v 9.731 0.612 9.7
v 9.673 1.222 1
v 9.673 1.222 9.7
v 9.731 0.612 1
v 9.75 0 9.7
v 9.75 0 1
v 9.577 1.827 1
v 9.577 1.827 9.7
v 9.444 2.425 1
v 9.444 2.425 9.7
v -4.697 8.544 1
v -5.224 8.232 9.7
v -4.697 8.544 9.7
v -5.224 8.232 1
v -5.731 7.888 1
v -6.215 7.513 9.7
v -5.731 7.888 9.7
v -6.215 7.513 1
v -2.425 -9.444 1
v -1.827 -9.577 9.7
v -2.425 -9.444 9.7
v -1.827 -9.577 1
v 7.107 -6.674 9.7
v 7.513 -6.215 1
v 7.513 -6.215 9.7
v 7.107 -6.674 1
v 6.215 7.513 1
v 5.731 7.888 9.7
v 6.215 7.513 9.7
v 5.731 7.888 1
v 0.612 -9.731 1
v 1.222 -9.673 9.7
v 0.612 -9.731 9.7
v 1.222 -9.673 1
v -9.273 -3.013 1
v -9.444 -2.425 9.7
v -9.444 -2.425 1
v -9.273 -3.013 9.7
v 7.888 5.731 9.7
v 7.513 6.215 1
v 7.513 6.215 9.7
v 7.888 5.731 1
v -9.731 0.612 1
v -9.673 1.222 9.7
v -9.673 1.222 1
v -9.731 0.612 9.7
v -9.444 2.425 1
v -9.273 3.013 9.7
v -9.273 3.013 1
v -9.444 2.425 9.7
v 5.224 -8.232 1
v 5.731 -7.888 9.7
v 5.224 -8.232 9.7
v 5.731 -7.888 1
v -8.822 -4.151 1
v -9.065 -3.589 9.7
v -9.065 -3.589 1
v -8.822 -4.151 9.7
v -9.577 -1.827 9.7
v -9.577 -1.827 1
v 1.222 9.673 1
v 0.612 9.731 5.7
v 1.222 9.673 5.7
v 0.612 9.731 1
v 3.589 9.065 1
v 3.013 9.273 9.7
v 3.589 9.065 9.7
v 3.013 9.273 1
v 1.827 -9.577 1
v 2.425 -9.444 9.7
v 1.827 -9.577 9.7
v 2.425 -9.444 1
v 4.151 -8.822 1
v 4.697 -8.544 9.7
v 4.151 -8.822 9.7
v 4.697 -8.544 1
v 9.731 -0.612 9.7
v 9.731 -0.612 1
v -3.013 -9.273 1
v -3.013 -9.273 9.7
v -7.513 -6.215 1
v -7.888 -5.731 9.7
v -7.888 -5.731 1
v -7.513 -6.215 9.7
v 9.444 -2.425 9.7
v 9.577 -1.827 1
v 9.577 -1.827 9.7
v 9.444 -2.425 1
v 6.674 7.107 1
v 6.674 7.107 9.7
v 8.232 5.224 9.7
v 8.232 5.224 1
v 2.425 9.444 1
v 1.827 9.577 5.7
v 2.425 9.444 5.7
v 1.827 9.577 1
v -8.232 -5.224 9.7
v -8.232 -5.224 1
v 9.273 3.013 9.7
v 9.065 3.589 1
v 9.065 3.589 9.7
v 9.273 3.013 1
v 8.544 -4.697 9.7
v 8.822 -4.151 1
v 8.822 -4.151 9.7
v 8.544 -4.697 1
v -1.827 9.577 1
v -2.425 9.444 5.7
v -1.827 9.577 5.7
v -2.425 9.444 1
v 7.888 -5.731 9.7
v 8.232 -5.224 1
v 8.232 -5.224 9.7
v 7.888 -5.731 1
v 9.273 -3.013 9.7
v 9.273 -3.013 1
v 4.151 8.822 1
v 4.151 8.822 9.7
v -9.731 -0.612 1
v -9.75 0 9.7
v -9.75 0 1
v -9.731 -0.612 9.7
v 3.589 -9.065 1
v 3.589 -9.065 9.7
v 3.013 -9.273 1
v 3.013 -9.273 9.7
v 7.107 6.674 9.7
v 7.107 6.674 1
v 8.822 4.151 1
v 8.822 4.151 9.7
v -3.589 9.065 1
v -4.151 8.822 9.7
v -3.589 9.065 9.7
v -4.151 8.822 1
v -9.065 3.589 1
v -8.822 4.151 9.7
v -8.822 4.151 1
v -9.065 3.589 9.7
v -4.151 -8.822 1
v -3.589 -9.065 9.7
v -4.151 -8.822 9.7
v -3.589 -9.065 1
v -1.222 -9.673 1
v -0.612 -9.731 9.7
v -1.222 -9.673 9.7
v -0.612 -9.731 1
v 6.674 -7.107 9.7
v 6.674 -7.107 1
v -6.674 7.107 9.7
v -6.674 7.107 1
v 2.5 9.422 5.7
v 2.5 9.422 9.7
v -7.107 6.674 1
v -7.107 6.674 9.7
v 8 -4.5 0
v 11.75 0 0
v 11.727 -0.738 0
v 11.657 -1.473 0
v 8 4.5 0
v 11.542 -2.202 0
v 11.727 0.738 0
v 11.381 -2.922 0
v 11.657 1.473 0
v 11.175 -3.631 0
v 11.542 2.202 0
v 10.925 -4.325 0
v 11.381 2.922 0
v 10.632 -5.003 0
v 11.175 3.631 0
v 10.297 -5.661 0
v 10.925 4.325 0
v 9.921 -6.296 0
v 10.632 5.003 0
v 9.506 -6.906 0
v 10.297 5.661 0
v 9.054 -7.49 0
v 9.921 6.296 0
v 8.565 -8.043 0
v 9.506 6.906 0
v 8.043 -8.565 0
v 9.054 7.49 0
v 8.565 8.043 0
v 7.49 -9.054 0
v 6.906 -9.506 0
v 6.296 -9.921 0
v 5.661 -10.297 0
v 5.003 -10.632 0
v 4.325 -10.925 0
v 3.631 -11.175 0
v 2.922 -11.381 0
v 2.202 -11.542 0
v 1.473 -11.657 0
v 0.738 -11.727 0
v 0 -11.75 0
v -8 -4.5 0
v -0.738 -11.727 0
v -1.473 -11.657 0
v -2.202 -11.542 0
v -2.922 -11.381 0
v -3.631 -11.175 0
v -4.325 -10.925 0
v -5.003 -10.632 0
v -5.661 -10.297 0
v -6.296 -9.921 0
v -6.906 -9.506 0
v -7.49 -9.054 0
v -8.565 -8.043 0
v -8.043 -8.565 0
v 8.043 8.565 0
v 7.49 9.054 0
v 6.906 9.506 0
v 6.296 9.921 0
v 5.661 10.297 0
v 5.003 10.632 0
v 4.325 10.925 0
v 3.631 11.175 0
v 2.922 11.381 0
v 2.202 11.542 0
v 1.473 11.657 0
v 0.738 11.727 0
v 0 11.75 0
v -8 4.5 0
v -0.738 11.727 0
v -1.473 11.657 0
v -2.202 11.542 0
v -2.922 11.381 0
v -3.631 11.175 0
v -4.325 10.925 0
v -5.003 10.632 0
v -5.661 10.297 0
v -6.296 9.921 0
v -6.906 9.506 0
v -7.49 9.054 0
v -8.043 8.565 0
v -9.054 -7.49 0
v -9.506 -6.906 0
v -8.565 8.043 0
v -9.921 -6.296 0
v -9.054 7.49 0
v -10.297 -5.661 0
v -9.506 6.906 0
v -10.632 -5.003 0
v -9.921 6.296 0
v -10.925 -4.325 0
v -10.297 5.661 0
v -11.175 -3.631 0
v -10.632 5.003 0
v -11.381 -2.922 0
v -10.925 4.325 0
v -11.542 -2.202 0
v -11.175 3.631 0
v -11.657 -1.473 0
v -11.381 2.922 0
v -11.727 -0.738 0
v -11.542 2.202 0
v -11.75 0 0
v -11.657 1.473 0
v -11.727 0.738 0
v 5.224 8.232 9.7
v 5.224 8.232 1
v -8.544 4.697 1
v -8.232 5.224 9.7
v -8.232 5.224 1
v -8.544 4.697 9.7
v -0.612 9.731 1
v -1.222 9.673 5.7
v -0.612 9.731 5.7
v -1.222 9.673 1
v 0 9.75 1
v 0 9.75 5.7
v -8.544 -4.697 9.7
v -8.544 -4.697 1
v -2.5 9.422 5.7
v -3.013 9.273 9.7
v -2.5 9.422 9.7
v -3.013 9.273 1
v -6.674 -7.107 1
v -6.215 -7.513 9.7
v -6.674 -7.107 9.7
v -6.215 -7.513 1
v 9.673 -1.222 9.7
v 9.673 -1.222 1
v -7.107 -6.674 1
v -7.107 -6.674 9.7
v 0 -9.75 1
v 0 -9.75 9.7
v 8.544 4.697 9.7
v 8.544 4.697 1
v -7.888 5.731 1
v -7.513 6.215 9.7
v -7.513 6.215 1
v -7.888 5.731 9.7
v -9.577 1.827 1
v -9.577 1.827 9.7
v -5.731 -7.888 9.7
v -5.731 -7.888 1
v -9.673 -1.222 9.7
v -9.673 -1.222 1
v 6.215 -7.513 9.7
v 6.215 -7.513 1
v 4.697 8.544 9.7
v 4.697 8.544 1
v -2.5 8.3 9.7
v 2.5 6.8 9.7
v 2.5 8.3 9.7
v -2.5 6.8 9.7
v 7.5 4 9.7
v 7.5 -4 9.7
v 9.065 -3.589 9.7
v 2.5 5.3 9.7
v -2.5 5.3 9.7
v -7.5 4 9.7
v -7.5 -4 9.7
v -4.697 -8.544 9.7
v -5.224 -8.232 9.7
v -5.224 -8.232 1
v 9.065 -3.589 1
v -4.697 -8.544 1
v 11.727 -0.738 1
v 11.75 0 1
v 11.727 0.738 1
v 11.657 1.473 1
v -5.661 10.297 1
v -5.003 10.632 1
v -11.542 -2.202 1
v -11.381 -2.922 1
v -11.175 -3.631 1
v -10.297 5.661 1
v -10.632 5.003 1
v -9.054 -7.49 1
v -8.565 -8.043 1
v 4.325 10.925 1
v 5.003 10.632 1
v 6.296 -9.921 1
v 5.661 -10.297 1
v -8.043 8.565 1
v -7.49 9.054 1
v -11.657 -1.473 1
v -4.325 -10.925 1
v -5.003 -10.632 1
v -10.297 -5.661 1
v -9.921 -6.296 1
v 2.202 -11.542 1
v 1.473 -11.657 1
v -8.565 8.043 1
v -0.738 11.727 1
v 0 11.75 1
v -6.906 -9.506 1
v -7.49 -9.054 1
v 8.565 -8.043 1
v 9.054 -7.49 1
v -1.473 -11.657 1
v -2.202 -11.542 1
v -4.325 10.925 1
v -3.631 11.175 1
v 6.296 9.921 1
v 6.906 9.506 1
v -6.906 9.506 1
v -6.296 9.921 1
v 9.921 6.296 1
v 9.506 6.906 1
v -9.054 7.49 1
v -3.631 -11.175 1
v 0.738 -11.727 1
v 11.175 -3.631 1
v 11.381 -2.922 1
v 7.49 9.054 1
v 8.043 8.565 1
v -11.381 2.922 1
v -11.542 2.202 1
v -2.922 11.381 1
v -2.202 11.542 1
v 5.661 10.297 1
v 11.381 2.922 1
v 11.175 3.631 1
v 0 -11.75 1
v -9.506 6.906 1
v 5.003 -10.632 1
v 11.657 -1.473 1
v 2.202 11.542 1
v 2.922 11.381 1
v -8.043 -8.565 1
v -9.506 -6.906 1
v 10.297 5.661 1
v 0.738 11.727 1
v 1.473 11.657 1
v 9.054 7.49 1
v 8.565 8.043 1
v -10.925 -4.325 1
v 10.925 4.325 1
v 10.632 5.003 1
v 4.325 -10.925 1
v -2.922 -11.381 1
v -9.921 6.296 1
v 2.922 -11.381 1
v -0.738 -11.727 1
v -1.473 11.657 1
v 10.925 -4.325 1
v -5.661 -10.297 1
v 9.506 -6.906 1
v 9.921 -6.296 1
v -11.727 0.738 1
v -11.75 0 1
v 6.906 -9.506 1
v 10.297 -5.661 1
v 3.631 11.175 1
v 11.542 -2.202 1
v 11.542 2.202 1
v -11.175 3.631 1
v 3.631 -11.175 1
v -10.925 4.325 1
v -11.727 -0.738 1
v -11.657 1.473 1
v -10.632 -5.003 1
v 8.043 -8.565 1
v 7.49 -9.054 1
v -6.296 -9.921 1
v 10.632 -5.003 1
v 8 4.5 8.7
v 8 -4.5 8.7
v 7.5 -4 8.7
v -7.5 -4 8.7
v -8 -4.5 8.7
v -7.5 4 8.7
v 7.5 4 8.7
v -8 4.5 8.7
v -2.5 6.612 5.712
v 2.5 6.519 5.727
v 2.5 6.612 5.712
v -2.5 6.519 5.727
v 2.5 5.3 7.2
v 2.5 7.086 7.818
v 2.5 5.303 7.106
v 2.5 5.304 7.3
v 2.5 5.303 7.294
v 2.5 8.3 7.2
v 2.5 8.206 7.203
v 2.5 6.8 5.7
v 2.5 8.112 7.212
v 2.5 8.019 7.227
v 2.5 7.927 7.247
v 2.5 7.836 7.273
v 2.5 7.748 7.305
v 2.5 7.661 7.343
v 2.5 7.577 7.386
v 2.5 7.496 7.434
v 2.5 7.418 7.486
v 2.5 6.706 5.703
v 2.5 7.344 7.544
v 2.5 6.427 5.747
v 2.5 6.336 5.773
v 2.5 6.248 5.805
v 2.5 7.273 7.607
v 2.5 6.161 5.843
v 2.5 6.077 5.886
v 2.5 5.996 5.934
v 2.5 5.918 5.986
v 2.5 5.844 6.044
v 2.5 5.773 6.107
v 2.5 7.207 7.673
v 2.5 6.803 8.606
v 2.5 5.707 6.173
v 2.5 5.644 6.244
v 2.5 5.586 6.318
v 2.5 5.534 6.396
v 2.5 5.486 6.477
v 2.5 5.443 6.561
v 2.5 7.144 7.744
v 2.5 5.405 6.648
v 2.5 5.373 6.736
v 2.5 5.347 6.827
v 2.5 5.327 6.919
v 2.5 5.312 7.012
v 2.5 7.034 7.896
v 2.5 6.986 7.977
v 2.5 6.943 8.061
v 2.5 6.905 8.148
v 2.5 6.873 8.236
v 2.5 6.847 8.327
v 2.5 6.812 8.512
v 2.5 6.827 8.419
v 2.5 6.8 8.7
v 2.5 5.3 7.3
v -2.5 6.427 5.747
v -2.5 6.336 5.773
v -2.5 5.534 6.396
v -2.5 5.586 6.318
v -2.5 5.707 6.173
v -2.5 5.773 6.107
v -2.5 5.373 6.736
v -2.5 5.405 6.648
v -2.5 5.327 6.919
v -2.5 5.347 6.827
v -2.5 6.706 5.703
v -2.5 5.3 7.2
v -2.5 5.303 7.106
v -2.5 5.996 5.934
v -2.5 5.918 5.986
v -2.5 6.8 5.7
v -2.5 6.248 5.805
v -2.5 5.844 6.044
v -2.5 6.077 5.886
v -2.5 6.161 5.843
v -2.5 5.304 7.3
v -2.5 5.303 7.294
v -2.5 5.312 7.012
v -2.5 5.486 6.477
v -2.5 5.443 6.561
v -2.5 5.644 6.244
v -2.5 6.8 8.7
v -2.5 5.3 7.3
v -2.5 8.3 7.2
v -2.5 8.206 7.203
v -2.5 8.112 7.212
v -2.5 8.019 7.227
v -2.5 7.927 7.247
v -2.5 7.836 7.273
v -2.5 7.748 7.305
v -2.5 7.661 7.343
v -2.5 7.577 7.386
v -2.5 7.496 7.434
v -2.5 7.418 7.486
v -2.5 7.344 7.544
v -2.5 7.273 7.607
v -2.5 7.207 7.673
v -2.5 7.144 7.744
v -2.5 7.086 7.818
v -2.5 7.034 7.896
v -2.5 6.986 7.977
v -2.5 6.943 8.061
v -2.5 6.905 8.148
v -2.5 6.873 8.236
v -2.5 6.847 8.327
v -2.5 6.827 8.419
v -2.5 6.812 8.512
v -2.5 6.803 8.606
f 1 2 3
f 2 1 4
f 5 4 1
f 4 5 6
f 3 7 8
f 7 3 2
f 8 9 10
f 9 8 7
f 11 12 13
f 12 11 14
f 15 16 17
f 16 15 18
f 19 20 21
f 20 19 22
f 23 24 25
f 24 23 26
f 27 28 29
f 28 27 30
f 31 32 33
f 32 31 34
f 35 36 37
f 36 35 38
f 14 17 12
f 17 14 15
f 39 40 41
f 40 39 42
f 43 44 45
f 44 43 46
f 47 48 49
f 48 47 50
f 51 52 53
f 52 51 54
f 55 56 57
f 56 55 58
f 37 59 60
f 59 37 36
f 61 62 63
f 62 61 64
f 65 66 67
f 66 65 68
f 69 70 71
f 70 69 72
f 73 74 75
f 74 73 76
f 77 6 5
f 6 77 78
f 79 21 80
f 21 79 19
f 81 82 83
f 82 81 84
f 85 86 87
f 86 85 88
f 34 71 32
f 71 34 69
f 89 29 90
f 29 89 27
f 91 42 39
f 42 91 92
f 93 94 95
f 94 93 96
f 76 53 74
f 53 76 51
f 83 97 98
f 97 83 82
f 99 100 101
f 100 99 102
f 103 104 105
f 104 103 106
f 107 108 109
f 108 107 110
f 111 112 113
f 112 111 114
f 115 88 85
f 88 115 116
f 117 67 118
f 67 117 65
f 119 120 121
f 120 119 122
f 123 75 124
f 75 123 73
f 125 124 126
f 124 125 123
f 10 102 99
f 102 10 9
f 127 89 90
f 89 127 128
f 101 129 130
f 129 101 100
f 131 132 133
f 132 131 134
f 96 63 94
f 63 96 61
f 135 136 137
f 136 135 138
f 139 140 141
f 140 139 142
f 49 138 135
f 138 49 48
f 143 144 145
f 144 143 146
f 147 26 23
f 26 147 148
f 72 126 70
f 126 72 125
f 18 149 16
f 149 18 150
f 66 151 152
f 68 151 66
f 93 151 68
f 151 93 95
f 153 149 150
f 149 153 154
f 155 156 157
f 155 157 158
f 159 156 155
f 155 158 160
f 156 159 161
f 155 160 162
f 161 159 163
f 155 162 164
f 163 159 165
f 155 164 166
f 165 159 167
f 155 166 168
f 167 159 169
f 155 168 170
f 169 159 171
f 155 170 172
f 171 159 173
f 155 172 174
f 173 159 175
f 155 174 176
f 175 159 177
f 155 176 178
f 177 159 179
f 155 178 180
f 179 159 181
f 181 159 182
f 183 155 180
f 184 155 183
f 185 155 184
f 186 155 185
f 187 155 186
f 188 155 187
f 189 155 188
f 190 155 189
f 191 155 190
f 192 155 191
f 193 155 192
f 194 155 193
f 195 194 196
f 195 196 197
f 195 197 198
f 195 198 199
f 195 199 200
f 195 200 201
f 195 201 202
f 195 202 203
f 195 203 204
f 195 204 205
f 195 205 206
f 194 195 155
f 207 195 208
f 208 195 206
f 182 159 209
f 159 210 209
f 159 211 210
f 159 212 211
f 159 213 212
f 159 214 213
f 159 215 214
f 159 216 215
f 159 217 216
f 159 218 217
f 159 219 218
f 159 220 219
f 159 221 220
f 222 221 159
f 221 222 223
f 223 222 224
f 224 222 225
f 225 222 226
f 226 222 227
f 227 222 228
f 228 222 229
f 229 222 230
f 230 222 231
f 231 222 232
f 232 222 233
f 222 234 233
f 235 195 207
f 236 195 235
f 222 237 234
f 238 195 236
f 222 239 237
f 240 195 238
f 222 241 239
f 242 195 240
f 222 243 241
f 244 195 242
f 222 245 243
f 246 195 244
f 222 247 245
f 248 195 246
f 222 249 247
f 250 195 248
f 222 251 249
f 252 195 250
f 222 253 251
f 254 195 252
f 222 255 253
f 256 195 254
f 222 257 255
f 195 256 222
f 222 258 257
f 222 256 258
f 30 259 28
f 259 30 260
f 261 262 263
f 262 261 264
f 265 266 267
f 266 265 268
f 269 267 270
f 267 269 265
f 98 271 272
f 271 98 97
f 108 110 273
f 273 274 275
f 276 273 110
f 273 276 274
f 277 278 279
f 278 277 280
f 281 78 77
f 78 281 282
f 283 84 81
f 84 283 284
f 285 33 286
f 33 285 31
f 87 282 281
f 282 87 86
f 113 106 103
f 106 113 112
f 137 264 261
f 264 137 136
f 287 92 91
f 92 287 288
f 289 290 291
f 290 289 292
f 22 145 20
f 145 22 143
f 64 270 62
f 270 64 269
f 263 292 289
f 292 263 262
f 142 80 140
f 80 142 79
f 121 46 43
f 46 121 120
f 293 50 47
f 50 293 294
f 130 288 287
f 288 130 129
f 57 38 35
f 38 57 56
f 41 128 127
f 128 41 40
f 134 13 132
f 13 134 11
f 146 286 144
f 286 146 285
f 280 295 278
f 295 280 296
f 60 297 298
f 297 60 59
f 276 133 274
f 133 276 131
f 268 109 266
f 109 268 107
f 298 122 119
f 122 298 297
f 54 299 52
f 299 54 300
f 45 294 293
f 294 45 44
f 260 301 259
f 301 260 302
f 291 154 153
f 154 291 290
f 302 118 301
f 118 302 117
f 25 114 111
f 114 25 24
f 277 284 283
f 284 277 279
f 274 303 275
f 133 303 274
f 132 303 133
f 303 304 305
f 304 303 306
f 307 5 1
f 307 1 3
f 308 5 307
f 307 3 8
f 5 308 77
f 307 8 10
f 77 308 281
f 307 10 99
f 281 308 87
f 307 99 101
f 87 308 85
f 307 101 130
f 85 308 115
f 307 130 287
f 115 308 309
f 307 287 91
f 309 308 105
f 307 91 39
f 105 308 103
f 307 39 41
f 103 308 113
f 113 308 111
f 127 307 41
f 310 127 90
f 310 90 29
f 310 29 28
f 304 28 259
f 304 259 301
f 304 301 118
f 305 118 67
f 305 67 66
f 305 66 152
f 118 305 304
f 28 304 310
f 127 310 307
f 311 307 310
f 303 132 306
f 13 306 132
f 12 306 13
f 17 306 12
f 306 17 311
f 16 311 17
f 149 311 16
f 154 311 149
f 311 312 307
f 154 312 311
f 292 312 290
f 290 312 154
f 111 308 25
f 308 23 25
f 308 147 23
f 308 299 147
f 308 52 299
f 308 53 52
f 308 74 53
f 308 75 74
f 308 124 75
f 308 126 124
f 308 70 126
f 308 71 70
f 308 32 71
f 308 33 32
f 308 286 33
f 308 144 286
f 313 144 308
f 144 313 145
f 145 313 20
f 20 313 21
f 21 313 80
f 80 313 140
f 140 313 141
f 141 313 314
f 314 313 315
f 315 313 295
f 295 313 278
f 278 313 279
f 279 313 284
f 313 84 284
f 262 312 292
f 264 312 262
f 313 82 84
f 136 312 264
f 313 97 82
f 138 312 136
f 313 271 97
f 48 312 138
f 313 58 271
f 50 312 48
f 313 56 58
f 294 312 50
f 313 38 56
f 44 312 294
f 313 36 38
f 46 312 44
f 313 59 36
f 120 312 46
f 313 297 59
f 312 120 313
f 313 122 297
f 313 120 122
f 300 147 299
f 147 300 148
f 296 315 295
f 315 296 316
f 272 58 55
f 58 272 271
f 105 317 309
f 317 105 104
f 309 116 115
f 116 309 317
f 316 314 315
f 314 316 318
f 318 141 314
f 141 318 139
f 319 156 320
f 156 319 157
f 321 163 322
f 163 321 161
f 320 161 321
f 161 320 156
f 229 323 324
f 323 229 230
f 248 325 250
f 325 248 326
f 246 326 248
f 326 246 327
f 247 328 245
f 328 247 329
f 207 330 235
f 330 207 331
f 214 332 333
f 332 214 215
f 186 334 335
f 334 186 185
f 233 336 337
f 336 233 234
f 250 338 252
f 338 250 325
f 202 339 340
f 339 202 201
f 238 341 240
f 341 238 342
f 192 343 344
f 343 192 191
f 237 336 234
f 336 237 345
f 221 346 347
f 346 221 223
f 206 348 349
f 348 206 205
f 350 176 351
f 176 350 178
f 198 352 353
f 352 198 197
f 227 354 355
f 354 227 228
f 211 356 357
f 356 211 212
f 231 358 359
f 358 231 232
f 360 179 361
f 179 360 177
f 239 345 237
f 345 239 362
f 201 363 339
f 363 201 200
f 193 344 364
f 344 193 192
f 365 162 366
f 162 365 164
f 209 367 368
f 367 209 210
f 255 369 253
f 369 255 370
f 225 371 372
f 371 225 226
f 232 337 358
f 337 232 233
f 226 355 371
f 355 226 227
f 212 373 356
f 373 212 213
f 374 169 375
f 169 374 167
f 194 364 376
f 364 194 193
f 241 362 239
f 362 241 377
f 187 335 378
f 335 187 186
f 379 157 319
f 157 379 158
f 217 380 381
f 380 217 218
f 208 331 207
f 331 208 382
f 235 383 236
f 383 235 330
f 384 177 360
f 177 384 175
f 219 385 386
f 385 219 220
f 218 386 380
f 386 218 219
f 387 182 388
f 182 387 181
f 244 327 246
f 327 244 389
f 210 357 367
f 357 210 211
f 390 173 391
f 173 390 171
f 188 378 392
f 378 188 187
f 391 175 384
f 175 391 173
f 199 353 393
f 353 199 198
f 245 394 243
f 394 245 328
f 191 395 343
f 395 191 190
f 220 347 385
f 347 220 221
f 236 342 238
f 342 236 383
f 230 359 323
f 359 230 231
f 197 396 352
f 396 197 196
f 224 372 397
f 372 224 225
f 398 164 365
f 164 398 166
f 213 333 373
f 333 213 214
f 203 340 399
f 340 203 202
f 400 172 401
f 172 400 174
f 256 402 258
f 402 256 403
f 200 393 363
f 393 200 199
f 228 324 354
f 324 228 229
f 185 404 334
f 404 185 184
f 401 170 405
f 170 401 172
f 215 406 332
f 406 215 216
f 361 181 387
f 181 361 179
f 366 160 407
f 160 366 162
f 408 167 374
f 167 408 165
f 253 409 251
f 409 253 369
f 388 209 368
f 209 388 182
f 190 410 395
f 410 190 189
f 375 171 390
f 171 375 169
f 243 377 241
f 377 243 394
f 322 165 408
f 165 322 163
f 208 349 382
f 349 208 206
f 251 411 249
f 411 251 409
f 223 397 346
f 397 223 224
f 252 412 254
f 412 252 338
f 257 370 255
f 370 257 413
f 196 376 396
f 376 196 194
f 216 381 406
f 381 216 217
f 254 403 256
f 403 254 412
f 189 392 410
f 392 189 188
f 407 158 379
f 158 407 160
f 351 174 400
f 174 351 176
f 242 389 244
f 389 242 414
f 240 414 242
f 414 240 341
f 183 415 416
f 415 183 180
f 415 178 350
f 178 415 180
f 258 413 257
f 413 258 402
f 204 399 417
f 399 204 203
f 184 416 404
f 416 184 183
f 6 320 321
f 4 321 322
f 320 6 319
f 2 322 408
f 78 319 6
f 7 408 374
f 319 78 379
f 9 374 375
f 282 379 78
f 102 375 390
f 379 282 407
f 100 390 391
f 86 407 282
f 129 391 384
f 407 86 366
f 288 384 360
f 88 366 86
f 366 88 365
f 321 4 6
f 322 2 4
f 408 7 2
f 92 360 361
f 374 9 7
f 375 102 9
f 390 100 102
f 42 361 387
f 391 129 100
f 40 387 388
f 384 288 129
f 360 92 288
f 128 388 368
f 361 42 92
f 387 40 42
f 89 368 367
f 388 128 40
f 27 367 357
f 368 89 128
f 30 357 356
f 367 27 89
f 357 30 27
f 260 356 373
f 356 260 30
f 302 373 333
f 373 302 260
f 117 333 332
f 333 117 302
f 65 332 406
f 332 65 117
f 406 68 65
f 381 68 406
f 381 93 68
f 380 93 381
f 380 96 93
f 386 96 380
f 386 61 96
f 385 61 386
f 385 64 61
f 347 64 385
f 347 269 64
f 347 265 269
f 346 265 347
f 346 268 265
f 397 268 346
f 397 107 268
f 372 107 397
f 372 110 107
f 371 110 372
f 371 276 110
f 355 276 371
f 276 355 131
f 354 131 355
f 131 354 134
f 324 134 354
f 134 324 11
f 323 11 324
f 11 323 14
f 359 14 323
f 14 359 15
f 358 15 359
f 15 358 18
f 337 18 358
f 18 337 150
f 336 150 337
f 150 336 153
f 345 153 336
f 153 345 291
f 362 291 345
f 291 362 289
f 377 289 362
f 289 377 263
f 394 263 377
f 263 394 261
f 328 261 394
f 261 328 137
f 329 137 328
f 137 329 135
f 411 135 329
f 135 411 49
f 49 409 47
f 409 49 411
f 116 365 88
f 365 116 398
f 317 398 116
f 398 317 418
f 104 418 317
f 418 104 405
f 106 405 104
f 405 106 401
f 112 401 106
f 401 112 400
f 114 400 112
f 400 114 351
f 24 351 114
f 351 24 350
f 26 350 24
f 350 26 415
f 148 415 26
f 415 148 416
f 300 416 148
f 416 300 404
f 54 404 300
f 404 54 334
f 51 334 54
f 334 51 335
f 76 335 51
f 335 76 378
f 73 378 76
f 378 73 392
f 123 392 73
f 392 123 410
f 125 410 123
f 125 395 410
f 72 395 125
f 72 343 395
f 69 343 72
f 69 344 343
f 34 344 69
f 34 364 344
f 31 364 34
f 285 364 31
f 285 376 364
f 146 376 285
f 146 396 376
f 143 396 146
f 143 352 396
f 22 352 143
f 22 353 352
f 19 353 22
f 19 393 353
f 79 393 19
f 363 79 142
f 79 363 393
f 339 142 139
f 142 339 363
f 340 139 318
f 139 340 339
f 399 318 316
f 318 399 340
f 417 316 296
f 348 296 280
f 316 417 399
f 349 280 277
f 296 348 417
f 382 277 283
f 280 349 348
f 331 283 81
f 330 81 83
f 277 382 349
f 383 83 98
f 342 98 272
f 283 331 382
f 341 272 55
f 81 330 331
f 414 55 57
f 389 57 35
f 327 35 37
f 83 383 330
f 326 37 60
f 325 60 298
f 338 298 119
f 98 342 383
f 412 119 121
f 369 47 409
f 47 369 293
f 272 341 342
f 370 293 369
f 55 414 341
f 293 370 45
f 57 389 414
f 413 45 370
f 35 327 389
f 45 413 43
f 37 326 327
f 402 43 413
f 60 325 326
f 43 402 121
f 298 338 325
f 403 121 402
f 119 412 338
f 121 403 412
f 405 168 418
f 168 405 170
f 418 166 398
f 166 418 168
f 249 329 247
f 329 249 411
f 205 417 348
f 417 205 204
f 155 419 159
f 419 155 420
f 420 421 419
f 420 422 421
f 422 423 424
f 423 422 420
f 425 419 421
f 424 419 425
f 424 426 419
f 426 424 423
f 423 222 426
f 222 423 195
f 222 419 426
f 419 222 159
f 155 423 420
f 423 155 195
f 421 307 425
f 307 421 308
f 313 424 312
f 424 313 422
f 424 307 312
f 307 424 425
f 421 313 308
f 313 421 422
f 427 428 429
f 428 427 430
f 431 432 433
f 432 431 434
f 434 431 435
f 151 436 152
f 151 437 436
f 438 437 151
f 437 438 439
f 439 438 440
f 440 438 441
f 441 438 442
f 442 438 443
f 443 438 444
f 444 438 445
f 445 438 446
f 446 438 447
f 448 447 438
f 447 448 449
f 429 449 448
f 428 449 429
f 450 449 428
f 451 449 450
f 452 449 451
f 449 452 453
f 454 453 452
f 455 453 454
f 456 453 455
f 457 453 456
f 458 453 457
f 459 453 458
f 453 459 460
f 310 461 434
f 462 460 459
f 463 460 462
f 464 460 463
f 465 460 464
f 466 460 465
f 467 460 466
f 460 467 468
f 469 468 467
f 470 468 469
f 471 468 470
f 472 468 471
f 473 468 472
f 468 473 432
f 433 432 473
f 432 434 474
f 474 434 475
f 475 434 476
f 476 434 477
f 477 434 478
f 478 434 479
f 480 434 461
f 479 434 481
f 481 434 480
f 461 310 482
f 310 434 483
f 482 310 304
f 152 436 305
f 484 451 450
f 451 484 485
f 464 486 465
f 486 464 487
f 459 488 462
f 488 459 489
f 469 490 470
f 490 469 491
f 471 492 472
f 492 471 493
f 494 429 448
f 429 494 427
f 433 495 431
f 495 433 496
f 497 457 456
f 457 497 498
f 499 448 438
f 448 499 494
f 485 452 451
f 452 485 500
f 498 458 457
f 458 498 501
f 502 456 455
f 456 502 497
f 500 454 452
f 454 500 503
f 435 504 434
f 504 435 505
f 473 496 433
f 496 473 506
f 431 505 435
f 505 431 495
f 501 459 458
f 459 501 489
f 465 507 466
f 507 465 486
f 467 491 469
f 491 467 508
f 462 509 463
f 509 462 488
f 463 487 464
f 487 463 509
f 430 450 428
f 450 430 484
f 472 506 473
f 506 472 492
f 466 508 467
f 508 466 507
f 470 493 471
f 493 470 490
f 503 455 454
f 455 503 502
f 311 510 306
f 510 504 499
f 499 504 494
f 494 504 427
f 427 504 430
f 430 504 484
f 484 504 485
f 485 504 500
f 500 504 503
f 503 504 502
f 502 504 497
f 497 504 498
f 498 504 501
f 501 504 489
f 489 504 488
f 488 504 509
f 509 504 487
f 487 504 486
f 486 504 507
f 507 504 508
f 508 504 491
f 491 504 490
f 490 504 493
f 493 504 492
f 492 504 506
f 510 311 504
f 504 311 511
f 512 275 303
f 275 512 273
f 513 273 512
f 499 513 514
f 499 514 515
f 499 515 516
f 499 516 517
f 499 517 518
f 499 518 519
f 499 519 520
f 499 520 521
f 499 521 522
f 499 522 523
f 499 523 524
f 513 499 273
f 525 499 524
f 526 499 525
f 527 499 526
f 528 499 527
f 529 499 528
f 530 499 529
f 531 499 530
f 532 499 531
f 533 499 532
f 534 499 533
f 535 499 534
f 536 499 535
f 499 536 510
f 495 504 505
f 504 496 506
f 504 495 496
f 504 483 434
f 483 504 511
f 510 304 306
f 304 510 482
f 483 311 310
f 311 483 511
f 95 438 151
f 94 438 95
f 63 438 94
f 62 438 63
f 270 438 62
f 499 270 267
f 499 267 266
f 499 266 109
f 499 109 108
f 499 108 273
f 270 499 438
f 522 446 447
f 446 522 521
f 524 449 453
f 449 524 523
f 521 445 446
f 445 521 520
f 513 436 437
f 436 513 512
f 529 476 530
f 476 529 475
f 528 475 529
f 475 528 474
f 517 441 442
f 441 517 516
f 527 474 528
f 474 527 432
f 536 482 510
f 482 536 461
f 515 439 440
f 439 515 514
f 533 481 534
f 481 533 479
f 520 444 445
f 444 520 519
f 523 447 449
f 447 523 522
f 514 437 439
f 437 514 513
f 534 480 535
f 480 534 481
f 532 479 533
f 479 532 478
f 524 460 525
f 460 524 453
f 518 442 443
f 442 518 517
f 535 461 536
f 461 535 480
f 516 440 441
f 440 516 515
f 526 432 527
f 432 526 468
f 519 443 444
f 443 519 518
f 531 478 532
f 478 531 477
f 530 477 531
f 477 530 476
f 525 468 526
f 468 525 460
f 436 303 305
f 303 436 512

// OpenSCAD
$fn=100;    	// zum testen den Wert auf <50 setzen

sl = 15.8+ 0.2;	// Steckerlänge + Toleranz
sb = 8.8 + 0.2; // Steckerbreite + Toleranz
sh = 8.7;		// Steckerhöhe;
rs = 1.2;		// Rahmenstärke
zb = 5.0;		// Breite Zugentlastung
zd = 1.5;		// Schlitzdicke Zugentlastung
db  = 20-0.5;   // Durchmesser Bohrung abzüglich Toleranz für leichteren Einbau
ra = 2;			// Überstand Rand aussen

difference() {
	Adapter();
	Zugentlastung();          
}

module Adapter() {
	difference() {
		union() {
			// Hauptzylinder
			cylinder(h=sh+1,d=db);
			// Rand herum
			cylinder(h=1,d=db+ra*2);
		}
		
		// Steckergehäuse weg
		translate([-sl/2,-sb/2,0]) cube([sl,sb,sh]);
		// Steckergehäuse Anschlag weg
		translate([-(sl-1)/2,-(sb-1)/2,sh]) cube([sl-1,sb-1,rs]);
	}
}	


module Zugentlastung() {
	// Zugentlastung rausschneiden
	difference() {
		union() {
			// von oben bis zur Biegung
			translate([-zb/2,sb/2+.8,sh-1.4]) cube([zb,zd,3]);
			translate([-zb/2,sb/2+zd+0.8,sh-zd*2]) cube([zb,3.5,zd]);
			color("blue") translate([-zb/2,sb/2+2.3,sh-zd]) cube([zb,zd,zd]);
			intersection() {
				color("blue") translate([-zb/2,sb/2+2.3,sh-zd]) color("red") rotate([0,90,0]) cylinder(h=zb,d=zd*2);
				color("red") translate([-zb/2,sb/2+.8,sh-zd*2]) color("red") cube([zb,zd*2,zd*2]);
			}
		}
		color("red") translate([-zb/2,(sb-1)/2+4.3,sh]) color("red") rotate([0,90,0]) cylinder(h=zb*2,d=zd*2);
	}
	translate([-zb/2,sb/2+.8+zd*2,sh-zd*2]) cube([zb,zd*2,zd+zd*2]);
}



// }
// color("red") {
	// difference() {
		// translate([-12.0/2,7.7/2,9.7]) cube([12.0,4,4]);
		// translate([-9.0/2,7.7/2,9.7]) cube([12.0,4,2]);
	// }
// }
